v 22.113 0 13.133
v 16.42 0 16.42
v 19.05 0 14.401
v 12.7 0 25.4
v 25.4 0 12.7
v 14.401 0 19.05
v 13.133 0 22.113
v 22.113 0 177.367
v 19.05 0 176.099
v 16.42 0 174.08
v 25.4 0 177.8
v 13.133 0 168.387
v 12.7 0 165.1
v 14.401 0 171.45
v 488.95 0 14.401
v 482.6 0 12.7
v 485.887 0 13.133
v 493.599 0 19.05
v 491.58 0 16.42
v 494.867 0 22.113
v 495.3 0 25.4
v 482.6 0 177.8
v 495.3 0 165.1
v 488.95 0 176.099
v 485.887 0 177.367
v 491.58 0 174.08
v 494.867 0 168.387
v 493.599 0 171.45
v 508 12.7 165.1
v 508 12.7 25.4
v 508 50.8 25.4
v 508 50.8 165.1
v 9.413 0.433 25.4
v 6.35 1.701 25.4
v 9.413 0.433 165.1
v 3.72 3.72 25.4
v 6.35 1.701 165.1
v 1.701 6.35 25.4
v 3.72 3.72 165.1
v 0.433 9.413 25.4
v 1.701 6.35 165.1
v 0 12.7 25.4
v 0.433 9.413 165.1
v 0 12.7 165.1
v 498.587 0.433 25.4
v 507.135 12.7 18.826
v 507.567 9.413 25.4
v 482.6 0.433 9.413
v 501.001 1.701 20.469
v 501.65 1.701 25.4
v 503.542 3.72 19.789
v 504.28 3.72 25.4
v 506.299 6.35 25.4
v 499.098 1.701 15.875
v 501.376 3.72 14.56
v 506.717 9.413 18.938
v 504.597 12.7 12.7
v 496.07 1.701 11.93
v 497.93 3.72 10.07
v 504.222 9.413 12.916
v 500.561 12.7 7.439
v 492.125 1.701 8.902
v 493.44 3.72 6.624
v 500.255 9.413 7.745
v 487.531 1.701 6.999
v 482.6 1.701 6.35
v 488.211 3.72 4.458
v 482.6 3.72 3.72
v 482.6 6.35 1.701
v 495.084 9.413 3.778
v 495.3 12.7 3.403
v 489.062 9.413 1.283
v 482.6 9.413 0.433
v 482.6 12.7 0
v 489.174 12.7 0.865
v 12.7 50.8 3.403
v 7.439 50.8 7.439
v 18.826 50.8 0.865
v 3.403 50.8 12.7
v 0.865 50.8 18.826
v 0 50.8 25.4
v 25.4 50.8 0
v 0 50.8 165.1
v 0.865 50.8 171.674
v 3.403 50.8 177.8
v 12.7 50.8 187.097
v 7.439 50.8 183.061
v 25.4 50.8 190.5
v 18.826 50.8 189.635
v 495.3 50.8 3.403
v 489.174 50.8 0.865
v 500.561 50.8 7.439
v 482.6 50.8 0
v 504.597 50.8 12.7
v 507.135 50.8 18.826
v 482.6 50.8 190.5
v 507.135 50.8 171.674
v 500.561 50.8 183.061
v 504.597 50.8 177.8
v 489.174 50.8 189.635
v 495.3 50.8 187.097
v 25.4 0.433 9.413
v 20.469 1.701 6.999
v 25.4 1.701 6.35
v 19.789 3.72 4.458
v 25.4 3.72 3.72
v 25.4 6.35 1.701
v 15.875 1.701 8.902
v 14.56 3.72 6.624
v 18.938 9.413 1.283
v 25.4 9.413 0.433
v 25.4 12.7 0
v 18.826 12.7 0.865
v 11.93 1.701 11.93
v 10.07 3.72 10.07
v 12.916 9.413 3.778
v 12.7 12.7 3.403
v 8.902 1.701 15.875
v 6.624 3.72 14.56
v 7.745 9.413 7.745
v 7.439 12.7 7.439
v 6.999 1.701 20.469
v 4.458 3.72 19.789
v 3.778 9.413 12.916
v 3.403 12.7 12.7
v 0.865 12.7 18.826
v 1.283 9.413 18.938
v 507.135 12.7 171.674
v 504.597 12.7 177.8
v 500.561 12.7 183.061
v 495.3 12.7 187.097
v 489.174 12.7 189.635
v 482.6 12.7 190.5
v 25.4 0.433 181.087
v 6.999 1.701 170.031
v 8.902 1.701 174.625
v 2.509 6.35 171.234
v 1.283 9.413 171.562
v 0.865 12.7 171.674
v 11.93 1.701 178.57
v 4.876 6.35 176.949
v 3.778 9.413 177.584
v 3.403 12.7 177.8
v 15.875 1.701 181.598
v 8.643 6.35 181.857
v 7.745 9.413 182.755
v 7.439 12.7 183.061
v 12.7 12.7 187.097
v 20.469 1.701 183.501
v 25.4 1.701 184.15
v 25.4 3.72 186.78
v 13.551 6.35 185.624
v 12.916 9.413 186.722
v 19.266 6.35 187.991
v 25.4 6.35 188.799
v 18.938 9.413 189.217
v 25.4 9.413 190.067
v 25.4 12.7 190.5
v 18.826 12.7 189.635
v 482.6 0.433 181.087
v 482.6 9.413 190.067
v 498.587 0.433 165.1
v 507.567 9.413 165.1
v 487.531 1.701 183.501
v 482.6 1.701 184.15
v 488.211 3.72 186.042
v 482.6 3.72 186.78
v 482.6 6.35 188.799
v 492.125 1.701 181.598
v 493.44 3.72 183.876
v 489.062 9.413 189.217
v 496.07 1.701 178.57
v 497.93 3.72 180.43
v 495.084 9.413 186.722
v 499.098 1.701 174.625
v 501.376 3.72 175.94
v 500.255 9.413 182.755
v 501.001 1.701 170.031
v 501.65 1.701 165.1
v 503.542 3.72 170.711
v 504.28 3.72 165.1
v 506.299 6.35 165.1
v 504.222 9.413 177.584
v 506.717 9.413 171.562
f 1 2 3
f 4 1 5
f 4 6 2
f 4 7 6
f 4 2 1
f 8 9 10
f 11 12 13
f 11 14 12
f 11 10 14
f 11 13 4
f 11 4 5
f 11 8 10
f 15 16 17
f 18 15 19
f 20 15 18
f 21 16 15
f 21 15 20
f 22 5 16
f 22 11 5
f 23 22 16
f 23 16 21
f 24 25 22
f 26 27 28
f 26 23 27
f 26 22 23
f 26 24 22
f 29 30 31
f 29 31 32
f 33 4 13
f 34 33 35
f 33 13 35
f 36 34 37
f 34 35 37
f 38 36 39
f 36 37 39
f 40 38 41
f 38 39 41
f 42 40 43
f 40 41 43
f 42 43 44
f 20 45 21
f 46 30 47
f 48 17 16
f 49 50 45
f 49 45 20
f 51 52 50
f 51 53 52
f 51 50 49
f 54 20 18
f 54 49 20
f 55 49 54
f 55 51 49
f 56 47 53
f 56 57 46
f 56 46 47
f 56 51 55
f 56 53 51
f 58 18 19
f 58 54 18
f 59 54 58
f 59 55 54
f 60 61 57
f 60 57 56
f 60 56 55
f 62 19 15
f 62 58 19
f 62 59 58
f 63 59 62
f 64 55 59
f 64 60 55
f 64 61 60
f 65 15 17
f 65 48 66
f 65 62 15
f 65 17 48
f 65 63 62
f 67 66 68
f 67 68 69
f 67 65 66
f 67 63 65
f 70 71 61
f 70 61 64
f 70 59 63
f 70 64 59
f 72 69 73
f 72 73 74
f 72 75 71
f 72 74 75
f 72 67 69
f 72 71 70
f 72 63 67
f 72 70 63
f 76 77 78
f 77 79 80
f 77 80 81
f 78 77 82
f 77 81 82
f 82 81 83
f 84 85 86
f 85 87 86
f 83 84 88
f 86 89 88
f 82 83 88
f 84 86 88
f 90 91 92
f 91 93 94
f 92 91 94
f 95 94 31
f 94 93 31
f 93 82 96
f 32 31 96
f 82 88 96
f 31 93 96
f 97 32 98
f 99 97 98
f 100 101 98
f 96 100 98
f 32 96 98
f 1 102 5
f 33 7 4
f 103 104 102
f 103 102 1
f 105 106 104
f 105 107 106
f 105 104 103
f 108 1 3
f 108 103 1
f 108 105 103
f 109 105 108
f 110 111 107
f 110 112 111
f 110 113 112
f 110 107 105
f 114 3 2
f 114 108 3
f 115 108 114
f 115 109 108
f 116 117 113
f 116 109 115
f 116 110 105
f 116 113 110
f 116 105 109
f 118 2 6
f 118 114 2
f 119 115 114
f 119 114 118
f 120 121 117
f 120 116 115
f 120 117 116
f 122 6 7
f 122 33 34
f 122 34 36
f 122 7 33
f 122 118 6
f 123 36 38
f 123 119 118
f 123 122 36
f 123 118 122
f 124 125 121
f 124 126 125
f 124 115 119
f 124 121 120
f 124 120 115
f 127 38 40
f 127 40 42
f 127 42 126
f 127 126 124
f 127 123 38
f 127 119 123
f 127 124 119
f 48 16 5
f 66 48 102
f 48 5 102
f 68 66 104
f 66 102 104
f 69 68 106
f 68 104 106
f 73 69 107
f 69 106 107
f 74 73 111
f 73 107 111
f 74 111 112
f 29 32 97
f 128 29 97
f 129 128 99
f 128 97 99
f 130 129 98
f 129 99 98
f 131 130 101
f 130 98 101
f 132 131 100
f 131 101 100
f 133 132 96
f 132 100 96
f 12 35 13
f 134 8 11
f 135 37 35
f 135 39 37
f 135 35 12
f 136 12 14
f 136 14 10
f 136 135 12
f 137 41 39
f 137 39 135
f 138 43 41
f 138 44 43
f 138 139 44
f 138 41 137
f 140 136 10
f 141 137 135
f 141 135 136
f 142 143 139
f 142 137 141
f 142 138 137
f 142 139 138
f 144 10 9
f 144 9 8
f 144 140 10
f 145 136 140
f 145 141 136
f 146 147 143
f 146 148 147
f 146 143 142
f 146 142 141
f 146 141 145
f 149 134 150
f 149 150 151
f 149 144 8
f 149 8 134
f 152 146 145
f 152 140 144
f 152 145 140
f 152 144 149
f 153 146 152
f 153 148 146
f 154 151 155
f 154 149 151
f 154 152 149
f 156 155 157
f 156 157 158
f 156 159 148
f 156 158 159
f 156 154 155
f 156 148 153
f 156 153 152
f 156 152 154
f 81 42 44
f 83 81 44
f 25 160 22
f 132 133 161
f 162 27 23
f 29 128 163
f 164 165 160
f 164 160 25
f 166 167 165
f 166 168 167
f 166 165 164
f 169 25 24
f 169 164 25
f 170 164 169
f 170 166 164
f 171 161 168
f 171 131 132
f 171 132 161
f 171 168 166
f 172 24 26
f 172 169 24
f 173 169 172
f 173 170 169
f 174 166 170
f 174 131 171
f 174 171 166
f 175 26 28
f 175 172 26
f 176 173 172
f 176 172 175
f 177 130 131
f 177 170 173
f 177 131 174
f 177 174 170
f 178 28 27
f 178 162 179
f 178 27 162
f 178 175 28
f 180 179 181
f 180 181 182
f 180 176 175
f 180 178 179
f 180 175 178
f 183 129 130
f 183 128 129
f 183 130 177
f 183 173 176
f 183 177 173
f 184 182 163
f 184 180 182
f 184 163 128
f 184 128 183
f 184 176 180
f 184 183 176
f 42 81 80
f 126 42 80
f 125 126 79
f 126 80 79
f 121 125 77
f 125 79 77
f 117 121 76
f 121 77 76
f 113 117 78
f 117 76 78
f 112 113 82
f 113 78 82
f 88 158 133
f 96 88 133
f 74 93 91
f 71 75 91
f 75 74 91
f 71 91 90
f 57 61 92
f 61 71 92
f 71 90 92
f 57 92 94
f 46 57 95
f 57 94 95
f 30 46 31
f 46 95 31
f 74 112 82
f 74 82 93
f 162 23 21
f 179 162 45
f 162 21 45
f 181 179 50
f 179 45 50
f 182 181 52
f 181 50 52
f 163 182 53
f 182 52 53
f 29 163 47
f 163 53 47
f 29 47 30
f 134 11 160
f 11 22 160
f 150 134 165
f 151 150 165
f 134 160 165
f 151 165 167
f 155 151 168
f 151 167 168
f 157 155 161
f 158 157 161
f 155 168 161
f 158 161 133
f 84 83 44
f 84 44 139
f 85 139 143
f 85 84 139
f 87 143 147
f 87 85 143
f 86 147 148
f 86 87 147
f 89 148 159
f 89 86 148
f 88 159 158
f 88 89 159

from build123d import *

# Parameters (mm, degrees)
F0_W     = 508
F0_H     = 190.5
F1_DEPTH = 50.8
F2_R     = 25.4
F3_R     = 12.7


with BuildPart() as f1:
    # F0 (on Front) → F1 (new body)
    with BuildSketch(Plane.XZ):
        with Locations((254, 95.25)):
            Rectangle(F0_W, F0_H)
    extrude(amount=-F1_DEPTH)

    # F2
    f2_edges = [f1.edges().sort_by_distance(p)[0] for p in [
        (0, 25.4, 190.5),
        (508, 25.4, 190.5),
        (508, 25.4, 0),
        (0, 25.4, 0),
    ]]
    fillet(f2_edges, radius=F2_R)

    # F3
    f3_edges = [f1.edges().sort_by_distance(p)[0] for p in [
        (254, 0, 190.5),
    ]]
    fillet(f3_edges, radius=F3_R)


solid = f1.part
